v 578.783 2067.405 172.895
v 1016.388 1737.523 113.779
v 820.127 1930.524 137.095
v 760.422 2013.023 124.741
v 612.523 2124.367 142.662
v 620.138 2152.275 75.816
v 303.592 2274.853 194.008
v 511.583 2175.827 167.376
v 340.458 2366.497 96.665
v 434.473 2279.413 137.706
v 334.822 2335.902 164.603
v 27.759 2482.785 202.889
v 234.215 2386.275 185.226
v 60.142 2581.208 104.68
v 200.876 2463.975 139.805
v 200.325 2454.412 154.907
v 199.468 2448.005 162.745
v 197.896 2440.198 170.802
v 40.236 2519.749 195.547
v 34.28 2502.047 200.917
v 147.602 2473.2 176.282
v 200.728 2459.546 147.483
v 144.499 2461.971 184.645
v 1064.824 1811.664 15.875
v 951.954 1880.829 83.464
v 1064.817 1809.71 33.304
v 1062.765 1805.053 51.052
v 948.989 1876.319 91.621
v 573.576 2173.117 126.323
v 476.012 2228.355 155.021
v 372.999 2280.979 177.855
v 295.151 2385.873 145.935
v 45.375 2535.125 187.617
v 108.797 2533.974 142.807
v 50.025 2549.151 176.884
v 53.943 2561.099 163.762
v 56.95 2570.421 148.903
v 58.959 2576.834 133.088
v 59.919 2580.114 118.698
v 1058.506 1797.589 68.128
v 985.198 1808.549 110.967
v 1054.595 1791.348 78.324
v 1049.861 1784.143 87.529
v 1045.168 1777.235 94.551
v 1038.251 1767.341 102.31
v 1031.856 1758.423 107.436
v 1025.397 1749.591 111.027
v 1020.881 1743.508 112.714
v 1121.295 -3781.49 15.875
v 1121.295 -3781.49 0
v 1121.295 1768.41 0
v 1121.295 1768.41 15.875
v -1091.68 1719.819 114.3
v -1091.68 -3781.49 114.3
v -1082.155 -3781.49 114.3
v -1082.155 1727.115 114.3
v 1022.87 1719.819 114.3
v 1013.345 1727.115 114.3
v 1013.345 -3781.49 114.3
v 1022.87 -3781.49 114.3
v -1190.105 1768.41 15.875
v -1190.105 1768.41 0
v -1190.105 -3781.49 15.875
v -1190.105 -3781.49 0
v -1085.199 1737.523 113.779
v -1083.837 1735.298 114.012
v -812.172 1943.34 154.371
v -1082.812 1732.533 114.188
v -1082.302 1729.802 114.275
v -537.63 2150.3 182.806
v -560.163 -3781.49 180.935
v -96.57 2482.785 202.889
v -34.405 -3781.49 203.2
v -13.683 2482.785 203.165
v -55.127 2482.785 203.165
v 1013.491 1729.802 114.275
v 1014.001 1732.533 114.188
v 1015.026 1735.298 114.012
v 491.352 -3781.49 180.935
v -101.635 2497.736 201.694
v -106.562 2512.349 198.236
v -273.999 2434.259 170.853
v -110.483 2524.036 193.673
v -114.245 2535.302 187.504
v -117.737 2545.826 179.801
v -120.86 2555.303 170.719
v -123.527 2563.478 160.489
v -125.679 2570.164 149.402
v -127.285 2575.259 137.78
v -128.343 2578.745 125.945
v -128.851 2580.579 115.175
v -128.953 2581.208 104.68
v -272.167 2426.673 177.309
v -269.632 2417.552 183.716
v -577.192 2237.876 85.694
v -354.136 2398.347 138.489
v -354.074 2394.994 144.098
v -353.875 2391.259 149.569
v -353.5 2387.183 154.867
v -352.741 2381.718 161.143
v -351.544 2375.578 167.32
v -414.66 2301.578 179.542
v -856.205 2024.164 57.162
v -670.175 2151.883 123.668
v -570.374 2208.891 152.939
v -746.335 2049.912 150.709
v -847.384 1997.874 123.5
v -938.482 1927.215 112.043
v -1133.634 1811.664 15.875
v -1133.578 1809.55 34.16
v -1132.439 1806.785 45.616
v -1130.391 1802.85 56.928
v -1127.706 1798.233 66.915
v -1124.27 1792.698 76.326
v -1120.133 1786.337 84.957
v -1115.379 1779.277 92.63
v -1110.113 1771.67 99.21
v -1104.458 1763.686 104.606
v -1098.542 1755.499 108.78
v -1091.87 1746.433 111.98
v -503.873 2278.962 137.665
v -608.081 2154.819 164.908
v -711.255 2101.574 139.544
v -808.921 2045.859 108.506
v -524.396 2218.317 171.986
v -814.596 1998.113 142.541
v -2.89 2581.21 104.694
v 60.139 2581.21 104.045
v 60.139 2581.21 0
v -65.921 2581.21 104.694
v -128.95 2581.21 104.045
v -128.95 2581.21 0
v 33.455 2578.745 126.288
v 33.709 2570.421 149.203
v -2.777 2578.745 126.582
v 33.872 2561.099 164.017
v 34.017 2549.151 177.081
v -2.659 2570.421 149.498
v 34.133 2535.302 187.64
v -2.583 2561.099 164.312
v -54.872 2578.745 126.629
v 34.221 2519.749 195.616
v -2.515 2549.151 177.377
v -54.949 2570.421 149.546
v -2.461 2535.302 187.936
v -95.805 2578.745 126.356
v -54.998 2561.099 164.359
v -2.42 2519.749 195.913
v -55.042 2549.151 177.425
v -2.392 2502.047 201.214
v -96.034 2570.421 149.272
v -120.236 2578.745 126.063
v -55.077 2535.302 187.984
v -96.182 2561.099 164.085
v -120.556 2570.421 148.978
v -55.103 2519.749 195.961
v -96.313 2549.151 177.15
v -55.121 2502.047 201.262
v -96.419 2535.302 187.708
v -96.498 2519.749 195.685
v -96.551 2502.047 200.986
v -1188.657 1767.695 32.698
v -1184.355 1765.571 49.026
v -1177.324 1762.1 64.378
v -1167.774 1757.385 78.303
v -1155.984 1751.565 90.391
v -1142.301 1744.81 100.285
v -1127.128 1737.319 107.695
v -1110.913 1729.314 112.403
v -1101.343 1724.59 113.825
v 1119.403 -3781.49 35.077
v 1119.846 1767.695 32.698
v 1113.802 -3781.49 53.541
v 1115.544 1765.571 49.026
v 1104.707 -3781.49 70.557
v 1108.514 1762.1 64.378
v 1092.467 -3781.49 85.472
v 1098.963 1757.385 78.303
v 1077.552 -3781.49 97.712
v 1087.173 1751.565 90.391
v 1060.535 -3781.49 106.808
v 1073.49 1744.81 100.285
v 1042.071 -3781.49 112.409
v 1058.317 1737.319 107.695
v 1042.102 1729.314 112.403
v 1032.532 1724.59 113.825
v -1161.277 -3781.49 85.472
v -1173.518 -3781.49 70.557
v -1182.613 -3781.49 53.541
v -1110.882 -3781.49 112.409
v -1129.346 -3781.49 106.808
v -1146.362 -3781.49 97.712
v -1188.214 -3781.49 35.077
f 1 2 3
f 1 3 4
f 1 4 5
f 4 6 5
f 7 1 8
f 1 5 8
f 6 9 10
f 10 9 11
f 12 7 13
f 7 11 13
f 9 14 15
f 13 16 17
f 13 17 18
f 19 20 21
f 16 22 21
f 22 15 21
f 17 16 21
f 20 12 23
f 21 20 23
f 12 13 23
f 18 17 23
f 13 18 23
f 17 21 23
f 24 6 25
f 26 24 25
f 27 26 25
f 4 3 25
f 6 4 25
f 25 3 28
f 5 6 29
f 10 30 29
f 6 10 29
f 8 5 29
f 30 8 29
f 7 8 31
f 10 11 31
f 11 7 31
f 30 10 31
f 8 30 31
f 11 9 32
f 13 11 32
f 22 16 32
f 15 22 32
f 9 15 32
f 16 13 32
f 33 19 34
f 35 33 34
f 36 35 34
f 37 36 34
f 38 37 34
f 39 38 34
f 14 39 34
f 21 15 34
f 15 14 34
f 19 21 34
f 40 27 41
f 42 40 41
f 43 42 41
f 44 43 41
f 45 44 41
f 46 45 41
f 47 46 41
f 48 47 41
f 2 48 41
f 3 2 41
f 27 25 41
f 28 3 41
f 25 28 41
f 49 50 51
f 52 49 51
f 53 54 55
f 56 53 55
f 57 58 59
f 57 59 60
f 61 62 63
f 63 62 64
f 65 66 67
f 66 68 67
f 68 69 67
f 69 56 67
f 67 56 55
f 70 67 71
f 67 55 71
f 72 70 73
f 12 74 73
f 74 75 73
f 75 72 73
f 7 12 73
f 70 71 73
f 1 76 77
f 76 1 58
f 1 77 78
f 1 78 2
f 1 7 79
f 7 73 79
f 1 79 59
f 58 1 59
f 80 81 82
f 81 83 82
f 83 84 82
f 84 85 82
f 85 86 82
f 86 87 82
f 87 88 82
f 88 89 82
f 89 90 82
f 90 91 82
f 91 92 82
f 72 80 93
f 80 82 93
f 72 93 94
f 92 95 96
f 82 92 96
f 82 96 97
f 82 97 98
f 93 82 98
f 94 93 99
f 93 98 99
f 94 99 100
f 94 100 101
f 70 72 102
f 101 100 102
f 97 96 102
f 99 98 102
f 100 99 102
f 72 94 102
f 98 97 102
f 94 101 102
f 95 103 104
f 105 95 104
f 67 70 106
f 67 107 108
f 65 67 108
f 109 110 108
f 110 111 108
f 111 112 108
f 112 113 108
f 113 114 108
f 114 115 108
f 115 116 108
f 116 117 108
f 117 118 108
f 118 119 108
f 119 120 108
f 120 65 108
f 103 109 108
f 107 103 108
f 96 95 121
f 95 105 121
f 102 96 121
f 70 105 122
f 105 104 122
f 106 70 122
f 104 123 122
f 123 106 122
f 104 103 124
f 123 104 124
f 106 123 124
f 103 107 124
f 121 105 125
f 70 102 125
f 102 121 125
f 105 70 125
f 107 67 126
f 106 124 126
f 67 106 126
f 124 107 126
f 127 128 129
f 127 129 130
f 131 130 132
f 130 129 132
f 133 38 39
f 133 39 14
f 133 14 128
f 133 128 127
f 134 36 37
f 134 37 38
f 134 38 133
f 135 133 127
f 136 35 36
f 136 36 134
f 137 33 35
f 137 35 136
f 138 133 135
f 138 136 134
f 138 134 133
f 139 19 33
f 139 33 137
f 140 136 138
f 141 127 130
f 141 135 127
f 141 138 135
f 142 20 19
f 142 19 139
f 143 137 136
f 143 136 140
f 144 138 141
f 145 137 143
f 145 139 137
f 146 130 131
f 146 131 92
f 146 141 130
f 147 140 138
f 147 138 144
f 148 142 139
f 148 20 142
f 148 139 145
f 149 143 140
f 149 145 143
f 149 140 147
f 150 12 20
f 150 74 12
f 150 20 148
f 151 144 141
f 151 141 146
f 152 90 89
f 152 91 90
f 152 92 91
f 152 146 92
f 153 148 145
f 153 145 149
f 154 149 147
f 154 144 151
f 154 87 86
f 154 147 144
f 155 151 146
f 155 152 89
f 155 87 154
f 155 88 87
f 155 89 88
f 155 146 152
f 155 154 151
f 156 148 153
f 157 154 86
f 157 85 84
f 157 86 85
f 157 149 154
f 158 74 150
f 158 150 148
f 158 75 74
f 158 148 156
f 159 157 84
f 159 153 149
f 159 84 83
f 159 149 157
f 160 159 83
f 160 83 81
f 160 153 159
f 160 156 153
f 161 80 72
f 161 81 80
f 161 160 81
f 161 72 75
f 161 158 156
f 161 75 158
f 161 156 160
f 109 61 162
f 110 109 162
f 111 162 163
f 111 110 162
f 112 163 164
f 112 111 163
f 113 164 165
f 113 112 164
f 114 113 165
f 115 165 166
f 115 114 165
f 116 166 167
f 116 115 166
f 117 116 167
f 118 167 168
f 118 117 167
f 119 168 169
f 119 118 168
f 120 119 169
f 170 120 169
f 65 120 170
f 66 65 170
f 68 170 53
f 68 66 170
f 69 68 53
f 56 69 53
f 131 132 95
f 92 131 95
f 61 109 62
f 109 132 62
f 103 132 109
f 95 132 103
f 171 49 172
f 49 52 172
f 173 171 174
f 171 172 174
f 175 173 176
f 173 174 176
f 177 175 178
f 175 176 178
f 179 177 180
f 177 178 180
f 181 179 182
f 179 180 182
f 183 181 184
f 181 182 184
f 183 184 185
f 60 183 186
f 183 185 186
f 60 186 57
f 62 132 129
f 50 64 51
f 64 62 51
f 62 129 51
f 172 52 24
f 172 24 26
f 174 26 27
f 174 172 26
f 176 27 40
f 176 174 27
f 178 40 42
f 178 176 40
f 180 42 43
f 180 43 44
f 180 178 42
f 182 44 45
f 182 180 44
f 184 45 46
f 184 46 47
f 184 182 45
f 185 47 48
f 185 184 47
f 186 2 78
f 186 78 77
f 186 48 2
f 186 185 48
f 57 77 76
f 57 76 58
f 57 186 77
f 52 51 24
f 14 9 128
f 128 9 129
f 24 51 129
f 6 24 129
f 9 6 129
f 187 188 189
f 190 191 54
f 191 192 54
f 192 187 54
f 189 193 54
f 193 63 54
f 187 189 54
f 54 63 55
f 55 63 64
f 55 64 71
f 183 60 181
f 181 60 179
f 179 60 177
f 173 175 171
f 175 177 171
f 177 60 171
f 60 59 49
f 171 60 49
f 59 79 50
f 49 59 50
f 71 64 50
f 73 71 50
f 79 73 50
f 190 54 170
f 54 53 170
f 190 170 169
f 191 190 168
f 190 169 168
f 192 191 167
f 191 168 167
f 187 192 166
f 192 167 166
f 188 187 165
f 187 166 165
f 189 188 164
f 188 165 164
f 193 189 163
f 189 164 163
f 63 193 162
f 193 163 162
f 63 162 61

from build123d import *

# Parameters (mm, degrees)
F1_DEPTH = 203.2
F3_DEPTH = 6451.6
F4_R     = 98.425


with BuildPart() as f1:
    # F0 (on Top) → F1 (new body)
    with BuildSketch(Plane.XY):
        Polygon((-1190.1054440712, -3781.489954734), (1121.2945559288, -3781.489954734), (1121.2945559288, 1768.410045266), (60.1390003732, 2581.210045266), (-128.9498885157, 2581.210045266), (-1190.1054440712, 1768.410045266), align=None)
    extrude(amount=F1_DEPTH)

    # F2 (on face) → F3 (cut)
    with BuildSketch(Plane.XZ.offset(3781.489954734)):
        with BuildLine():
            ThreePointArc((-34.4054247497, 203.2), (491.3519412759, 180.935141609), (1013.3445559288, 114.3000000001))
            Line((1013.3445559287, 114.3), (1121.2945559288, 114.3))
            Line((1121.2945559288, 114.3), (1121.2945559288, 203.2))
            Line((1121.2945559288, 203.2), (-34.4054247497, 203.2))
        make_face()
        with BuildLine():
            ThreePointArc((-1082.1554440713, 114.3000000001), (-560.162810166, 180.9351432425), (-34.4054247497, 203.2))
            Line((-34.4054247497, 203.2), (-1190.1054440712, 203.2))
            Line((-1190.1054440712, 203.2), (-1190.1054440712, 114.3000000001))
            Line((-1190.1054440712, 114.3000000001), (-1082.1554440712, 114.3000000001))
        make_face()
    extrude(amount=-F3_DEPTH, mode=Mode.SUBTRACT)

    # F4
    f4_edges = [f1.edges().sort_by_distance(p)[0] for p in [
        (1121.294556, -1006.539955, 114.3),
        (537.816704, 2215.329251, 176.817097),
        (-606.627592, 2215.329251, 176.817097),
        (1067.319556, 1809.752598, 114.3),
        (-1136.130444, 1809.752598, 114.3),
        (-1190.105444, -1006.539955, 114.3),
        (-34.405444, 2581.210045, 203.2),
    ]]
    fillet(f4_edges, radius=F4_R)


solid = f1.part
